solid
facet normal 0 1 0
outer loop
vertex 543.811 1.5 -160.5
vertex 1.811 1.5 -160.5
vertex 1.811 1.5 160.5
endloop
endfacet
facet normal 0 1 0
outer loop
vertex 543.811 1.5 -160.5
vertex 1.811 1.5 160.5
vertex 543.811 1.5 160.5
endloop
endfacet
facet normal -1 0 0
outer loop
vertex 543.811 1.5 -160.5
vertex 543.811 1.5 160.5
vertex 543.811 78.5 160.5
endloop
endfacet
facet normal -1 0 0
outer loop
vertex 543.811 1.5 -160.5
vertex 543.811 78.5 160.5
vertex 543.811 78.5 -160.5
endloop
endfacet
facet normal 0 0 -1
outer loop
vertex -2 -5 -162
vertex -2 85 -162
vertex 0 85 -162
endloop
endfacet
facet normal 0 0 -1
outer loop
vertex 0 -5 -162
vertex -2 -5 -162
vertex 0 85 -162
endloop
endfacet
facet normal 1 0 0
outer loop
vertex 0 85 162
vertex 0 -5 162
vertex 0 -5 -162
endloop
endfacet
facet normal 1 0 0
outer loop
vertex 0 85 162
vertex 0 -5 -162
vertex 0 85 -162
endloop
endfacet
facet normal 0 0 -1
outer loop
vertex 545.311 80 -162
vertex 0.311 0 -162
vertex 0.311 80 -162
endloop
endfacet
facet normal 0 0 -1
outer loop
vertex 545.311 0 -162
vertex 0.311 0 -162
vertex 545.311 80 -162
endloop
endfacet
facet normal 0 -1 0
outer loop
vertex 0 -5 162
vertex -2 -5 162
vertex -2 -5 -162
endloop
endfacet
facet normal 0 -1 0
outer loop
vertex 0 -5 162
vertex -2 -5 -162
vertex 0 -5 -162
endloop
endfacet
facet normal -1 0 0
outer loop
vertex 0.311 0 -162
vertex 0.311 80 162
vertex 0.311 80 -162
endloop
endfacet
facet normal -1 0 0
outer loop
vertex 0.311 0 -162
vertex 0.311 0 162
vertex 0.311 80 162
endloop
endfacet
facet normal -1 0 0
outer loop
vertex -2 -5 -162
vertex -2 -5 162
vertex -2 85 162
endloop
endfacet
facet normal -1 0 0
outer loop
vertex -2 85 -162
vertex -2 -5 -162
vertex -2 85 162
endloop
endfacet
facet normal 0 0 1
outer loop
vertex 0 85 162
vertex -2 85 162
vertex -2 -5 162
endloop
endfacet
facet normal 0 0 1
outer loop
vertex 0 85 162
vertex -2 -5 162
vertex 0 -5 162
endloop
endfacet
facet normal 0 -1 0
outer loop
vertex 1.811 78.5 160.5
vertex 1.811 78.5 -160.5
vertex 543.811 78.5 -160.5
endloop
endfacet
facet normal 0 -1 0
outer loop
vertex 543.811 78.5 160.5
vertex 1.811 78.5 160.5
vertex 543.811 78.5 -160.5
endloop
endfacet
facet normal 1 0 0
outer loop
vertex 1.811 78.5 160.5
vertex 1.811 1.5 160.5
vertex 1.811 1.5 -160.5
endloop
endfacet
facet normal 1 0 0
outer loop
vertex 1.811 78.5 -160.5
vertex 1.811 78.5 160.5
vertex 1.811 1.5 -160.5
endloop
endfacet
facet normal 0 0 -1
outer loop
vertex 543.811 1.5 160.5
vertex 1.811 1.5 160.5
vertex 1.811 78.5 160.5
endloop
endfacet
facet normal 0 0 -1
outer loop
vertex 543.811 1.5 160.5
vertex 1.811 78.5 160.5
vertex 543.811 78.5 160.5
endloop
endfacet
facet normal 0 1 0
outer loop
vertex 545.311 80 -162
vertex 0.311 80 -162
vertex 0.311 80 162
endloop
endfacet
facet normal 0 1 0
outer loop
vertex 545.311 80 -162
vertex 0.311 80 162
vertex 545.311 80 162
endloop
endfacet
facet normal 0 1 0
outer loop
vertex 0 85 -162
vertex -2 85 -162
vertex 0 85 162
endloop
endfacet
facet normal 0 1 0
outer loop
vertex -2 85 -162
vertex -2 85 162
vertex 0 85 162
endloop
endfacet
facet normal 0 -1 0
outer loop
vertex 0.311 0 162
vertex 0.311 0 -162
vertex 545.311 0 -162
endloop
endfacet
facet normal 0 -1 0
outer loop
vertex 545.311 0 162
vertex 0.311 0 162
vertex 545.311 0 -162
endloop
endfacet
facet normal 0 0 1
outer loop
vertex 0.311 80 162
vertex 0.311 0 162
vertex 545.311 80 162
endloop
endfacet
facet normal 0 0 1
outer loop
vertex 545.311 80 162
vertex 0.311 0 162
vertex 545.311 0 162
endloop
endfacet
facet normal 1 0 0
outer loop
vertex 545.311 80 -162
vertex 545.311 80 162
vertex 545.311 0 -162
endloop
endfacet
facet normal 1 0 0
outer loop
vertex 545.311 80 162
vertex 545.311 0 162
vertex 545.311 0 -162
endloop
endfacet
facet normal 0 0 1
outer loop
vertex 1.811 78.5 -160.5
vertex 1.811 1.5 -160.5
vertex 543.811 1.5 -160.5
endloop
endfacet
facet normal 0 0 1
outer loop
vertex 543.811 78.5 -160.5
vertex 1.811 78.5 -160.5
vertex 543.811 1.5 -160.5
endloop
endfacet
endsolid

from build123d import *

# Parameters (mm, degrees)
EXTRUDE_1_OUTLINE_W     = 545
EXTRUDE_1_OUTLINE_H     = 324
EXTRUDE_1_DEPTH         = 1.5
EXTRUDE_START           = 78.5
EXTRUDE_1_2_OUTLINE_W   = 545
EXTRUDE_1_2_OUTLINE_H   = 324
EXTRUDE_1_2_DEPTH       = 1.5
EXTRUDE_START_2         = 1.5
EXTRUDE_1_3_OUTLINE_W   = 545
EXTRUDE_1_3_OUTLINE_H   = 324
EXTRUDE_1_3_OUTLINE_W_2 = 542
EXTRUDE_1_3_OUTLINE_H_2 = 321
EXTRUDE_1_3_DEPTH       = 77
SKETCH_2_W              = 2
SKETCH_2_H              = 90
EXTRUDE_2_DEPTH         = 162


# Read off the part's stored shape, not the designer's step: Вытянуть-Тонкостенный1
with BuildPart() as part:
    # Вытянуть-Тонкостенный1 outline → Вытянуть-Тонкостенный1 (new body)
    with BuildSketch(Plane(origin=(0, 0, 0), x_dir=(1, 0, 0), z_dir=(0, 1, 0))):
        with Locations((272.810788, 0)):
            Rectangle(EXTRUDE_1_OUTLINE_W, EXTRUDE_1_OUTLINE_H)
    extrude(amount=EXTRUDE_1_DEPTH)



with BuildPart() as body_2:
    # Extrude 1 2 outline → Extrude 1 2 (new body)
    with BuildSketch(Plane(origin=(0, 0, 0), x_dir=(1, 0, 0), z_dir=(0, 1, 0)).offset(EXTRUDE_START)):
        with Locations((272.810788, 0)):
            Rectangle(EXTRUDE_1_2_OUTLINE_W, EXTRUDE_1_2_OUTLINE_H)
    extrude(amount=EXTRUDE_1_2_DEPTH)


with BuildPart() as part_1:
    add(part.part)

    add(body_2.part)  # Extrude 1 3 merges body 2
    # Extrude 1 3 outline → Extrude 1 3 (add)
    with BuildSketch(Plane(origin=(0, 0, 0), x_dir=(1, 0, 0), z_dir=(0, 1, 0)).offset(EXTRUDE_START_2)):
        with Locations((272.810788, 0)):
            Rectangle(EXTRUDE_1_3_OUTLINE_W, EXTRUDE_1_3_OUTLINE_H)
        with Locations((272.810788, 0)):
            Rectangle(EXTRUDE_1_3_OUTLINE_W_2, EXTRUDE_1_3_OUTLINE_H_2, mode=Mode.SUBTRACT)
    extrude(amount=EXTRUDE_1_3_DEPTH)


with BuildPart() as body_2_2:
    # Эскиз2 → Вытянуть-Тонкостенный2 (new, symmetric)
    with BuildSketch(Plane.XY):
        with Locations((-1, 40)):
            Rectangle(SKETCH_2_W, SKETCH_2_H)
    extrude(amount=EXTRUDE_2_DEPTH, both=True)


solid = Compound([part_1.part, body_2_2.part])
